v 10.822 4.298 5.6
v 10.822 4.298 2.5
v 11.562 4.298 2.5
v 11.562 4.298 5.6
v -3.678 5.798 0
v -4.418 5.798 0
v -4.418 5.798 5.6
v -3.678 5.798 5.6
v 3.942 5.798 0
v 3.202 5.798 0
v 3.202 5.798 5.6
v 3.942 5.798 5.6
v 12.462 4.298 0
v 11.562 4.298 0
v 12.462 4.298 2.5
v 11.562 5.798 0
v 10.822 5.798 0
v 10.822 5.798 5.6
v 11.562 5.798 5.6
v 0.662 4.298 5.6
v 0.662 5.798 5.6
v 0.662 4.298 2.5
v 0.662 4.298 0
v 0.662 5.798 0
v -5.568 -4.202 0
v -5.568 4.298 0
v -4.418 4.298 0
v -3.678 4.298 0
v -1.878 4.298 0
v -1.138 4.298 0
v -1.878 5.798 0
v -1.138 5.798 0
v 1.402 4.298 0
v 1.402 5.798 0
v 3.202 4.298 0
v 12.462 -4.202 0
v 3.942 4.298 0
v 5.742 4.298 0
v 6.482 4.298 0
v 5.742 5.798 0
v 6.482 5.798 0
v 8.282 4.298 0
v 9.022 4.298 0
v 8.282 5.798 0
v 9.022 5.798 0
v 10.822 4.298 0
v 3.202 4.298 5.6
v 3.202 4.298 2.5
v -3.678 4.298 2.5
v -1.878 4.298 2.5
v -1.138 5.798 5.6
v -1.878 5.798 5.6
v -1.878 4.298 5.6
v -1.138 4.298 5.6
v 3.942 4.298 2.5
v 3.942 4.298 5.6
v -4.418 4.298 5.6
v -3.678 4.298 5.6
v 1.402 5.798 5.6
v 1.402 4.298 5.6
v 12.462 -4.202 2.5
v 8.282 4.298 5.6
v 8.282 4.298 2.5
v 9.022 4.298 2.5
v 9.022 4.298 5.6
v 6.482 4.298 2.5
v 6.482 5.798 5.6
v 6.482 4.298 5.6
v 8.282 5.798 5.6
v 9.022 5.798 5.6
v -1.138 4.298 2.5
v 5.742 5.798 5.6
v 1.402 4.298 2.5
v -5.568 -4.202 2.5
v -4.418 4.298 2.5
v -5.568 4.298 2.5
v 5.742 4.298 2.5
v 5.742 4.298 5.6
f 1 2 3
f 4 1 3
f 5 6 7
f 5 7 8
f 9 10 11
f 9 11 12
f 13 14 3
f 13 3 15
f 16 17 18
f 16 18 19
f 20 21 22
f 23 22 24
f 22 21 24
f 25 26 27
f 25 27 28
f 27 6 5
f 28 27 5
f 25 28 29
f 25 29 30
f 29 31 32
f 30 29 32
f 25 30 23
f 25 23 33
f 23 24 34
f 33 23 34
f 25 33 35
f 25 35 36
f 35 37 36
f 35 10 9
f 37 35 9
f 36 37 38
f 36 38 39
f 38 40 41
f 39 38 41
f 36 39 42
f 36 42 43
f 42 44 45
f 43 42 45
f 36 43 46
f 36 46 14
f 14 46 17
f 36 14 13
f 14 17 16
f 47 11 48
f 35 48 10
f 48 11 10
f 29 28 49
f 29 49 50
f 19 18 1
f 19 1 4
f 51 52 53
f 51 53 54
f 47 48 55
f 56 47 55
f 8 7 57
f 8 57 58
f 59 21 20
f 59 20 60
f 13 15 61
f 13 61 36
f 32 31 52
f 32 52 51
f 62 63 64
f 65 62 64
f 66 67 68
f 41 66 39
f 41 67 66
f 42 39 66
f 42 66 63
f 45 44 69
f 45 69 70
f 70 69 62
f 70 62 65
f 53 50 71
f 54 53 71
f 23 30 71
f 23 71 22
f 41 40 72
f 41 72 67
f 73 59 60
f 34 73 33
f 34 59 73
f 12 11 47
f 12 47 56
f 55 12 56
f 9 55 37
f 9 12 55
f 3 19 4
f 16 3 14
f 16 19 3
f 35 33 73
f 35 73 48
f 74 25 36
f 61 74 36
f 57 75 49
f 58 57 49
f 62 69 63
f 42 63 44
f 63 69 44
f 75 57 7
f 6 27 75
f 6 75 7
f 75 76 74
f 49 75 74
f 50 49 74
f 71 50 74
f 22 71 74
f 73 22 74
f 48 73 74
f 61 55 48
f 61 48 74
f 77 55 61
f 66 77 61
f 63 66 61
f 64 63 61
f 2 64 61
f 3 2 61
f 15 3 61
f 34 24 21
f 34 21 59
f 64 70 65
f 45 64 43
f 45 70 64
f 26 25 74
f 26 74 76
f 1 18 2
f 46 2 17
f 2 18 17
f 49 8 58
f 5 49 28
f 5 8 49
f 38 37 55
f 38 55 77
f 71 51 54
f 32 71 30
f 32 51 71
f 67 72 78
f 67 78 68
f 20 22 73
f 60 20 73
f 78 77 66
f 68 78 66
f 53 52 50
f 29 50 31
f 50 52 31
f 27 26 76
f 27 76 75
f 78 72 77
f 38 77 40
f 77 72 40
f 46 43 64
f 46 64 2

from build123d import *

# Parameters (mm, degrees)
SKETCH_1_W               = 25.9
SKETCH_1_H               = 8.5
EXTRUDE_1_DEPTH          = 2.5
SKETCH_1_5_W             = 23.6
SKETCH_1_5_H             = 1.5
EXTRUDE_2_DEPTH          = 2.5
SKETCH_2_W               = 23.6
SKETCH_2_H               = 1.5
EXTRUDE_3_DEPTH          = 3.1
SKETCH_3_W               = 1.8
SKETCH_3_H               = 5.6
CUT_EXTRUDE_1_DEPTH      = 1.5
CUT_EXTRUDE_2_DEPTH      = 2
CUT_EXTRUDE_2_DEPTH_BACK = 10
SKETCH_4_W               = 8.769979371
SKETCH_4_H               = 7.729949766


with BuildPart() as part:
    # 草图1 → 凸台-拉伸1 (new body)
    with BuildSketch(Plane.XY):
        with Locations((7.382170543, 0.04770021)):
            Rectangle(SKETCH_1_W, SKETCH_1_H)
    extrude(amount=EXTRUDE_1_DEPTH)

    # 草图1<5> → 凸台-拉伸2 (add)
    with BuildSketch(Plane.XY):
        with Locations((7.382170543, 5.04770021)):
            Rectangle(SKETCH_1_5_W, SKETCH_1_5_H)
    extrude(amount=EXTRUDE_2_DEPTH)

    # 草图2 → 凸台-拉伸3 (add)
    with BuildSketch(Plane.XY.offset(2.5)):
        with Locations((7.382170543, 5.04770021)):
            Rectangle(SKETCH_2_W, SKETCH_2_H)
    extrude(amount=EXTRUDE_3_DEPTH)

    # 草图3 → 切除-拉伸1 (cut)
    with BuildSketch(Plane(origin=(0, 5.79770021, 0), x_dir=(1, 0, 0), z_dir=(0, 1, 0))):
        with Locations((17.542170543, -2.8)):
            Rectangle(SKETCH_3_W, SKETCH_3_H)
        with Locations((15.002170543, -2.8)):
            Rectangle(SKETCH_3_W, SKETCH_3_H)
        with Locations((12.462170543, -2.8)):
            Rectangle(SKETCH_3_W, SKETCH_3_H)
        with Locations((9.922170543, -2.8)):
            Rectangle(SKETCH_3_W, SKETCH_3_H)
        with Locations((7.382170543, -2.8)):
            Rectangle(SKETCH_3_W, SKETCH_3_H)
        with Locations((4.842170543, -2.8)):
            Rectangle(SKETCH_3_W, SKETCH_3_H)
        with Locations((2.302170543, -2.8)):
            Rectangle(SKETCH_3_W, SKETCH_3_H)
        with Locations((-0.237829457, -2.8)):
            Rectangle(SKETCH_3_W, SKETCH_3_H)
        with Locations((-2.777829457, -2.8)):
            Rectangle(SKETCH_3_W, SKETCH_3_H)
    extrude(amount=-CUT_EXTRUDE_1_DEPTH, mode=Mode.SUBTRACT)

    # 草图4 → 切除-拉伸2 (cut, two sides: drawn at the far end of the back side and taken through both)
    with BuildSketch(Plane(origin=(0, 4.29770021, 0), x_dir=(1, 0, 0), z_dir=(0, 1, 0)).offset(-CUT_EXTRUDE_2_DEPTH_BACK)):
        with Locations((16.847160229, -2.378366376)):
            Rectangle(SKETCH_4_W, SKETCH_4_H)
    extrude(amount=CUT_EXTRUDE_2_DEPTH + CUT_EXTRUDE_2_DEPTH_BACK, mode=Mode.SUBTRACT)


solid = part.part
